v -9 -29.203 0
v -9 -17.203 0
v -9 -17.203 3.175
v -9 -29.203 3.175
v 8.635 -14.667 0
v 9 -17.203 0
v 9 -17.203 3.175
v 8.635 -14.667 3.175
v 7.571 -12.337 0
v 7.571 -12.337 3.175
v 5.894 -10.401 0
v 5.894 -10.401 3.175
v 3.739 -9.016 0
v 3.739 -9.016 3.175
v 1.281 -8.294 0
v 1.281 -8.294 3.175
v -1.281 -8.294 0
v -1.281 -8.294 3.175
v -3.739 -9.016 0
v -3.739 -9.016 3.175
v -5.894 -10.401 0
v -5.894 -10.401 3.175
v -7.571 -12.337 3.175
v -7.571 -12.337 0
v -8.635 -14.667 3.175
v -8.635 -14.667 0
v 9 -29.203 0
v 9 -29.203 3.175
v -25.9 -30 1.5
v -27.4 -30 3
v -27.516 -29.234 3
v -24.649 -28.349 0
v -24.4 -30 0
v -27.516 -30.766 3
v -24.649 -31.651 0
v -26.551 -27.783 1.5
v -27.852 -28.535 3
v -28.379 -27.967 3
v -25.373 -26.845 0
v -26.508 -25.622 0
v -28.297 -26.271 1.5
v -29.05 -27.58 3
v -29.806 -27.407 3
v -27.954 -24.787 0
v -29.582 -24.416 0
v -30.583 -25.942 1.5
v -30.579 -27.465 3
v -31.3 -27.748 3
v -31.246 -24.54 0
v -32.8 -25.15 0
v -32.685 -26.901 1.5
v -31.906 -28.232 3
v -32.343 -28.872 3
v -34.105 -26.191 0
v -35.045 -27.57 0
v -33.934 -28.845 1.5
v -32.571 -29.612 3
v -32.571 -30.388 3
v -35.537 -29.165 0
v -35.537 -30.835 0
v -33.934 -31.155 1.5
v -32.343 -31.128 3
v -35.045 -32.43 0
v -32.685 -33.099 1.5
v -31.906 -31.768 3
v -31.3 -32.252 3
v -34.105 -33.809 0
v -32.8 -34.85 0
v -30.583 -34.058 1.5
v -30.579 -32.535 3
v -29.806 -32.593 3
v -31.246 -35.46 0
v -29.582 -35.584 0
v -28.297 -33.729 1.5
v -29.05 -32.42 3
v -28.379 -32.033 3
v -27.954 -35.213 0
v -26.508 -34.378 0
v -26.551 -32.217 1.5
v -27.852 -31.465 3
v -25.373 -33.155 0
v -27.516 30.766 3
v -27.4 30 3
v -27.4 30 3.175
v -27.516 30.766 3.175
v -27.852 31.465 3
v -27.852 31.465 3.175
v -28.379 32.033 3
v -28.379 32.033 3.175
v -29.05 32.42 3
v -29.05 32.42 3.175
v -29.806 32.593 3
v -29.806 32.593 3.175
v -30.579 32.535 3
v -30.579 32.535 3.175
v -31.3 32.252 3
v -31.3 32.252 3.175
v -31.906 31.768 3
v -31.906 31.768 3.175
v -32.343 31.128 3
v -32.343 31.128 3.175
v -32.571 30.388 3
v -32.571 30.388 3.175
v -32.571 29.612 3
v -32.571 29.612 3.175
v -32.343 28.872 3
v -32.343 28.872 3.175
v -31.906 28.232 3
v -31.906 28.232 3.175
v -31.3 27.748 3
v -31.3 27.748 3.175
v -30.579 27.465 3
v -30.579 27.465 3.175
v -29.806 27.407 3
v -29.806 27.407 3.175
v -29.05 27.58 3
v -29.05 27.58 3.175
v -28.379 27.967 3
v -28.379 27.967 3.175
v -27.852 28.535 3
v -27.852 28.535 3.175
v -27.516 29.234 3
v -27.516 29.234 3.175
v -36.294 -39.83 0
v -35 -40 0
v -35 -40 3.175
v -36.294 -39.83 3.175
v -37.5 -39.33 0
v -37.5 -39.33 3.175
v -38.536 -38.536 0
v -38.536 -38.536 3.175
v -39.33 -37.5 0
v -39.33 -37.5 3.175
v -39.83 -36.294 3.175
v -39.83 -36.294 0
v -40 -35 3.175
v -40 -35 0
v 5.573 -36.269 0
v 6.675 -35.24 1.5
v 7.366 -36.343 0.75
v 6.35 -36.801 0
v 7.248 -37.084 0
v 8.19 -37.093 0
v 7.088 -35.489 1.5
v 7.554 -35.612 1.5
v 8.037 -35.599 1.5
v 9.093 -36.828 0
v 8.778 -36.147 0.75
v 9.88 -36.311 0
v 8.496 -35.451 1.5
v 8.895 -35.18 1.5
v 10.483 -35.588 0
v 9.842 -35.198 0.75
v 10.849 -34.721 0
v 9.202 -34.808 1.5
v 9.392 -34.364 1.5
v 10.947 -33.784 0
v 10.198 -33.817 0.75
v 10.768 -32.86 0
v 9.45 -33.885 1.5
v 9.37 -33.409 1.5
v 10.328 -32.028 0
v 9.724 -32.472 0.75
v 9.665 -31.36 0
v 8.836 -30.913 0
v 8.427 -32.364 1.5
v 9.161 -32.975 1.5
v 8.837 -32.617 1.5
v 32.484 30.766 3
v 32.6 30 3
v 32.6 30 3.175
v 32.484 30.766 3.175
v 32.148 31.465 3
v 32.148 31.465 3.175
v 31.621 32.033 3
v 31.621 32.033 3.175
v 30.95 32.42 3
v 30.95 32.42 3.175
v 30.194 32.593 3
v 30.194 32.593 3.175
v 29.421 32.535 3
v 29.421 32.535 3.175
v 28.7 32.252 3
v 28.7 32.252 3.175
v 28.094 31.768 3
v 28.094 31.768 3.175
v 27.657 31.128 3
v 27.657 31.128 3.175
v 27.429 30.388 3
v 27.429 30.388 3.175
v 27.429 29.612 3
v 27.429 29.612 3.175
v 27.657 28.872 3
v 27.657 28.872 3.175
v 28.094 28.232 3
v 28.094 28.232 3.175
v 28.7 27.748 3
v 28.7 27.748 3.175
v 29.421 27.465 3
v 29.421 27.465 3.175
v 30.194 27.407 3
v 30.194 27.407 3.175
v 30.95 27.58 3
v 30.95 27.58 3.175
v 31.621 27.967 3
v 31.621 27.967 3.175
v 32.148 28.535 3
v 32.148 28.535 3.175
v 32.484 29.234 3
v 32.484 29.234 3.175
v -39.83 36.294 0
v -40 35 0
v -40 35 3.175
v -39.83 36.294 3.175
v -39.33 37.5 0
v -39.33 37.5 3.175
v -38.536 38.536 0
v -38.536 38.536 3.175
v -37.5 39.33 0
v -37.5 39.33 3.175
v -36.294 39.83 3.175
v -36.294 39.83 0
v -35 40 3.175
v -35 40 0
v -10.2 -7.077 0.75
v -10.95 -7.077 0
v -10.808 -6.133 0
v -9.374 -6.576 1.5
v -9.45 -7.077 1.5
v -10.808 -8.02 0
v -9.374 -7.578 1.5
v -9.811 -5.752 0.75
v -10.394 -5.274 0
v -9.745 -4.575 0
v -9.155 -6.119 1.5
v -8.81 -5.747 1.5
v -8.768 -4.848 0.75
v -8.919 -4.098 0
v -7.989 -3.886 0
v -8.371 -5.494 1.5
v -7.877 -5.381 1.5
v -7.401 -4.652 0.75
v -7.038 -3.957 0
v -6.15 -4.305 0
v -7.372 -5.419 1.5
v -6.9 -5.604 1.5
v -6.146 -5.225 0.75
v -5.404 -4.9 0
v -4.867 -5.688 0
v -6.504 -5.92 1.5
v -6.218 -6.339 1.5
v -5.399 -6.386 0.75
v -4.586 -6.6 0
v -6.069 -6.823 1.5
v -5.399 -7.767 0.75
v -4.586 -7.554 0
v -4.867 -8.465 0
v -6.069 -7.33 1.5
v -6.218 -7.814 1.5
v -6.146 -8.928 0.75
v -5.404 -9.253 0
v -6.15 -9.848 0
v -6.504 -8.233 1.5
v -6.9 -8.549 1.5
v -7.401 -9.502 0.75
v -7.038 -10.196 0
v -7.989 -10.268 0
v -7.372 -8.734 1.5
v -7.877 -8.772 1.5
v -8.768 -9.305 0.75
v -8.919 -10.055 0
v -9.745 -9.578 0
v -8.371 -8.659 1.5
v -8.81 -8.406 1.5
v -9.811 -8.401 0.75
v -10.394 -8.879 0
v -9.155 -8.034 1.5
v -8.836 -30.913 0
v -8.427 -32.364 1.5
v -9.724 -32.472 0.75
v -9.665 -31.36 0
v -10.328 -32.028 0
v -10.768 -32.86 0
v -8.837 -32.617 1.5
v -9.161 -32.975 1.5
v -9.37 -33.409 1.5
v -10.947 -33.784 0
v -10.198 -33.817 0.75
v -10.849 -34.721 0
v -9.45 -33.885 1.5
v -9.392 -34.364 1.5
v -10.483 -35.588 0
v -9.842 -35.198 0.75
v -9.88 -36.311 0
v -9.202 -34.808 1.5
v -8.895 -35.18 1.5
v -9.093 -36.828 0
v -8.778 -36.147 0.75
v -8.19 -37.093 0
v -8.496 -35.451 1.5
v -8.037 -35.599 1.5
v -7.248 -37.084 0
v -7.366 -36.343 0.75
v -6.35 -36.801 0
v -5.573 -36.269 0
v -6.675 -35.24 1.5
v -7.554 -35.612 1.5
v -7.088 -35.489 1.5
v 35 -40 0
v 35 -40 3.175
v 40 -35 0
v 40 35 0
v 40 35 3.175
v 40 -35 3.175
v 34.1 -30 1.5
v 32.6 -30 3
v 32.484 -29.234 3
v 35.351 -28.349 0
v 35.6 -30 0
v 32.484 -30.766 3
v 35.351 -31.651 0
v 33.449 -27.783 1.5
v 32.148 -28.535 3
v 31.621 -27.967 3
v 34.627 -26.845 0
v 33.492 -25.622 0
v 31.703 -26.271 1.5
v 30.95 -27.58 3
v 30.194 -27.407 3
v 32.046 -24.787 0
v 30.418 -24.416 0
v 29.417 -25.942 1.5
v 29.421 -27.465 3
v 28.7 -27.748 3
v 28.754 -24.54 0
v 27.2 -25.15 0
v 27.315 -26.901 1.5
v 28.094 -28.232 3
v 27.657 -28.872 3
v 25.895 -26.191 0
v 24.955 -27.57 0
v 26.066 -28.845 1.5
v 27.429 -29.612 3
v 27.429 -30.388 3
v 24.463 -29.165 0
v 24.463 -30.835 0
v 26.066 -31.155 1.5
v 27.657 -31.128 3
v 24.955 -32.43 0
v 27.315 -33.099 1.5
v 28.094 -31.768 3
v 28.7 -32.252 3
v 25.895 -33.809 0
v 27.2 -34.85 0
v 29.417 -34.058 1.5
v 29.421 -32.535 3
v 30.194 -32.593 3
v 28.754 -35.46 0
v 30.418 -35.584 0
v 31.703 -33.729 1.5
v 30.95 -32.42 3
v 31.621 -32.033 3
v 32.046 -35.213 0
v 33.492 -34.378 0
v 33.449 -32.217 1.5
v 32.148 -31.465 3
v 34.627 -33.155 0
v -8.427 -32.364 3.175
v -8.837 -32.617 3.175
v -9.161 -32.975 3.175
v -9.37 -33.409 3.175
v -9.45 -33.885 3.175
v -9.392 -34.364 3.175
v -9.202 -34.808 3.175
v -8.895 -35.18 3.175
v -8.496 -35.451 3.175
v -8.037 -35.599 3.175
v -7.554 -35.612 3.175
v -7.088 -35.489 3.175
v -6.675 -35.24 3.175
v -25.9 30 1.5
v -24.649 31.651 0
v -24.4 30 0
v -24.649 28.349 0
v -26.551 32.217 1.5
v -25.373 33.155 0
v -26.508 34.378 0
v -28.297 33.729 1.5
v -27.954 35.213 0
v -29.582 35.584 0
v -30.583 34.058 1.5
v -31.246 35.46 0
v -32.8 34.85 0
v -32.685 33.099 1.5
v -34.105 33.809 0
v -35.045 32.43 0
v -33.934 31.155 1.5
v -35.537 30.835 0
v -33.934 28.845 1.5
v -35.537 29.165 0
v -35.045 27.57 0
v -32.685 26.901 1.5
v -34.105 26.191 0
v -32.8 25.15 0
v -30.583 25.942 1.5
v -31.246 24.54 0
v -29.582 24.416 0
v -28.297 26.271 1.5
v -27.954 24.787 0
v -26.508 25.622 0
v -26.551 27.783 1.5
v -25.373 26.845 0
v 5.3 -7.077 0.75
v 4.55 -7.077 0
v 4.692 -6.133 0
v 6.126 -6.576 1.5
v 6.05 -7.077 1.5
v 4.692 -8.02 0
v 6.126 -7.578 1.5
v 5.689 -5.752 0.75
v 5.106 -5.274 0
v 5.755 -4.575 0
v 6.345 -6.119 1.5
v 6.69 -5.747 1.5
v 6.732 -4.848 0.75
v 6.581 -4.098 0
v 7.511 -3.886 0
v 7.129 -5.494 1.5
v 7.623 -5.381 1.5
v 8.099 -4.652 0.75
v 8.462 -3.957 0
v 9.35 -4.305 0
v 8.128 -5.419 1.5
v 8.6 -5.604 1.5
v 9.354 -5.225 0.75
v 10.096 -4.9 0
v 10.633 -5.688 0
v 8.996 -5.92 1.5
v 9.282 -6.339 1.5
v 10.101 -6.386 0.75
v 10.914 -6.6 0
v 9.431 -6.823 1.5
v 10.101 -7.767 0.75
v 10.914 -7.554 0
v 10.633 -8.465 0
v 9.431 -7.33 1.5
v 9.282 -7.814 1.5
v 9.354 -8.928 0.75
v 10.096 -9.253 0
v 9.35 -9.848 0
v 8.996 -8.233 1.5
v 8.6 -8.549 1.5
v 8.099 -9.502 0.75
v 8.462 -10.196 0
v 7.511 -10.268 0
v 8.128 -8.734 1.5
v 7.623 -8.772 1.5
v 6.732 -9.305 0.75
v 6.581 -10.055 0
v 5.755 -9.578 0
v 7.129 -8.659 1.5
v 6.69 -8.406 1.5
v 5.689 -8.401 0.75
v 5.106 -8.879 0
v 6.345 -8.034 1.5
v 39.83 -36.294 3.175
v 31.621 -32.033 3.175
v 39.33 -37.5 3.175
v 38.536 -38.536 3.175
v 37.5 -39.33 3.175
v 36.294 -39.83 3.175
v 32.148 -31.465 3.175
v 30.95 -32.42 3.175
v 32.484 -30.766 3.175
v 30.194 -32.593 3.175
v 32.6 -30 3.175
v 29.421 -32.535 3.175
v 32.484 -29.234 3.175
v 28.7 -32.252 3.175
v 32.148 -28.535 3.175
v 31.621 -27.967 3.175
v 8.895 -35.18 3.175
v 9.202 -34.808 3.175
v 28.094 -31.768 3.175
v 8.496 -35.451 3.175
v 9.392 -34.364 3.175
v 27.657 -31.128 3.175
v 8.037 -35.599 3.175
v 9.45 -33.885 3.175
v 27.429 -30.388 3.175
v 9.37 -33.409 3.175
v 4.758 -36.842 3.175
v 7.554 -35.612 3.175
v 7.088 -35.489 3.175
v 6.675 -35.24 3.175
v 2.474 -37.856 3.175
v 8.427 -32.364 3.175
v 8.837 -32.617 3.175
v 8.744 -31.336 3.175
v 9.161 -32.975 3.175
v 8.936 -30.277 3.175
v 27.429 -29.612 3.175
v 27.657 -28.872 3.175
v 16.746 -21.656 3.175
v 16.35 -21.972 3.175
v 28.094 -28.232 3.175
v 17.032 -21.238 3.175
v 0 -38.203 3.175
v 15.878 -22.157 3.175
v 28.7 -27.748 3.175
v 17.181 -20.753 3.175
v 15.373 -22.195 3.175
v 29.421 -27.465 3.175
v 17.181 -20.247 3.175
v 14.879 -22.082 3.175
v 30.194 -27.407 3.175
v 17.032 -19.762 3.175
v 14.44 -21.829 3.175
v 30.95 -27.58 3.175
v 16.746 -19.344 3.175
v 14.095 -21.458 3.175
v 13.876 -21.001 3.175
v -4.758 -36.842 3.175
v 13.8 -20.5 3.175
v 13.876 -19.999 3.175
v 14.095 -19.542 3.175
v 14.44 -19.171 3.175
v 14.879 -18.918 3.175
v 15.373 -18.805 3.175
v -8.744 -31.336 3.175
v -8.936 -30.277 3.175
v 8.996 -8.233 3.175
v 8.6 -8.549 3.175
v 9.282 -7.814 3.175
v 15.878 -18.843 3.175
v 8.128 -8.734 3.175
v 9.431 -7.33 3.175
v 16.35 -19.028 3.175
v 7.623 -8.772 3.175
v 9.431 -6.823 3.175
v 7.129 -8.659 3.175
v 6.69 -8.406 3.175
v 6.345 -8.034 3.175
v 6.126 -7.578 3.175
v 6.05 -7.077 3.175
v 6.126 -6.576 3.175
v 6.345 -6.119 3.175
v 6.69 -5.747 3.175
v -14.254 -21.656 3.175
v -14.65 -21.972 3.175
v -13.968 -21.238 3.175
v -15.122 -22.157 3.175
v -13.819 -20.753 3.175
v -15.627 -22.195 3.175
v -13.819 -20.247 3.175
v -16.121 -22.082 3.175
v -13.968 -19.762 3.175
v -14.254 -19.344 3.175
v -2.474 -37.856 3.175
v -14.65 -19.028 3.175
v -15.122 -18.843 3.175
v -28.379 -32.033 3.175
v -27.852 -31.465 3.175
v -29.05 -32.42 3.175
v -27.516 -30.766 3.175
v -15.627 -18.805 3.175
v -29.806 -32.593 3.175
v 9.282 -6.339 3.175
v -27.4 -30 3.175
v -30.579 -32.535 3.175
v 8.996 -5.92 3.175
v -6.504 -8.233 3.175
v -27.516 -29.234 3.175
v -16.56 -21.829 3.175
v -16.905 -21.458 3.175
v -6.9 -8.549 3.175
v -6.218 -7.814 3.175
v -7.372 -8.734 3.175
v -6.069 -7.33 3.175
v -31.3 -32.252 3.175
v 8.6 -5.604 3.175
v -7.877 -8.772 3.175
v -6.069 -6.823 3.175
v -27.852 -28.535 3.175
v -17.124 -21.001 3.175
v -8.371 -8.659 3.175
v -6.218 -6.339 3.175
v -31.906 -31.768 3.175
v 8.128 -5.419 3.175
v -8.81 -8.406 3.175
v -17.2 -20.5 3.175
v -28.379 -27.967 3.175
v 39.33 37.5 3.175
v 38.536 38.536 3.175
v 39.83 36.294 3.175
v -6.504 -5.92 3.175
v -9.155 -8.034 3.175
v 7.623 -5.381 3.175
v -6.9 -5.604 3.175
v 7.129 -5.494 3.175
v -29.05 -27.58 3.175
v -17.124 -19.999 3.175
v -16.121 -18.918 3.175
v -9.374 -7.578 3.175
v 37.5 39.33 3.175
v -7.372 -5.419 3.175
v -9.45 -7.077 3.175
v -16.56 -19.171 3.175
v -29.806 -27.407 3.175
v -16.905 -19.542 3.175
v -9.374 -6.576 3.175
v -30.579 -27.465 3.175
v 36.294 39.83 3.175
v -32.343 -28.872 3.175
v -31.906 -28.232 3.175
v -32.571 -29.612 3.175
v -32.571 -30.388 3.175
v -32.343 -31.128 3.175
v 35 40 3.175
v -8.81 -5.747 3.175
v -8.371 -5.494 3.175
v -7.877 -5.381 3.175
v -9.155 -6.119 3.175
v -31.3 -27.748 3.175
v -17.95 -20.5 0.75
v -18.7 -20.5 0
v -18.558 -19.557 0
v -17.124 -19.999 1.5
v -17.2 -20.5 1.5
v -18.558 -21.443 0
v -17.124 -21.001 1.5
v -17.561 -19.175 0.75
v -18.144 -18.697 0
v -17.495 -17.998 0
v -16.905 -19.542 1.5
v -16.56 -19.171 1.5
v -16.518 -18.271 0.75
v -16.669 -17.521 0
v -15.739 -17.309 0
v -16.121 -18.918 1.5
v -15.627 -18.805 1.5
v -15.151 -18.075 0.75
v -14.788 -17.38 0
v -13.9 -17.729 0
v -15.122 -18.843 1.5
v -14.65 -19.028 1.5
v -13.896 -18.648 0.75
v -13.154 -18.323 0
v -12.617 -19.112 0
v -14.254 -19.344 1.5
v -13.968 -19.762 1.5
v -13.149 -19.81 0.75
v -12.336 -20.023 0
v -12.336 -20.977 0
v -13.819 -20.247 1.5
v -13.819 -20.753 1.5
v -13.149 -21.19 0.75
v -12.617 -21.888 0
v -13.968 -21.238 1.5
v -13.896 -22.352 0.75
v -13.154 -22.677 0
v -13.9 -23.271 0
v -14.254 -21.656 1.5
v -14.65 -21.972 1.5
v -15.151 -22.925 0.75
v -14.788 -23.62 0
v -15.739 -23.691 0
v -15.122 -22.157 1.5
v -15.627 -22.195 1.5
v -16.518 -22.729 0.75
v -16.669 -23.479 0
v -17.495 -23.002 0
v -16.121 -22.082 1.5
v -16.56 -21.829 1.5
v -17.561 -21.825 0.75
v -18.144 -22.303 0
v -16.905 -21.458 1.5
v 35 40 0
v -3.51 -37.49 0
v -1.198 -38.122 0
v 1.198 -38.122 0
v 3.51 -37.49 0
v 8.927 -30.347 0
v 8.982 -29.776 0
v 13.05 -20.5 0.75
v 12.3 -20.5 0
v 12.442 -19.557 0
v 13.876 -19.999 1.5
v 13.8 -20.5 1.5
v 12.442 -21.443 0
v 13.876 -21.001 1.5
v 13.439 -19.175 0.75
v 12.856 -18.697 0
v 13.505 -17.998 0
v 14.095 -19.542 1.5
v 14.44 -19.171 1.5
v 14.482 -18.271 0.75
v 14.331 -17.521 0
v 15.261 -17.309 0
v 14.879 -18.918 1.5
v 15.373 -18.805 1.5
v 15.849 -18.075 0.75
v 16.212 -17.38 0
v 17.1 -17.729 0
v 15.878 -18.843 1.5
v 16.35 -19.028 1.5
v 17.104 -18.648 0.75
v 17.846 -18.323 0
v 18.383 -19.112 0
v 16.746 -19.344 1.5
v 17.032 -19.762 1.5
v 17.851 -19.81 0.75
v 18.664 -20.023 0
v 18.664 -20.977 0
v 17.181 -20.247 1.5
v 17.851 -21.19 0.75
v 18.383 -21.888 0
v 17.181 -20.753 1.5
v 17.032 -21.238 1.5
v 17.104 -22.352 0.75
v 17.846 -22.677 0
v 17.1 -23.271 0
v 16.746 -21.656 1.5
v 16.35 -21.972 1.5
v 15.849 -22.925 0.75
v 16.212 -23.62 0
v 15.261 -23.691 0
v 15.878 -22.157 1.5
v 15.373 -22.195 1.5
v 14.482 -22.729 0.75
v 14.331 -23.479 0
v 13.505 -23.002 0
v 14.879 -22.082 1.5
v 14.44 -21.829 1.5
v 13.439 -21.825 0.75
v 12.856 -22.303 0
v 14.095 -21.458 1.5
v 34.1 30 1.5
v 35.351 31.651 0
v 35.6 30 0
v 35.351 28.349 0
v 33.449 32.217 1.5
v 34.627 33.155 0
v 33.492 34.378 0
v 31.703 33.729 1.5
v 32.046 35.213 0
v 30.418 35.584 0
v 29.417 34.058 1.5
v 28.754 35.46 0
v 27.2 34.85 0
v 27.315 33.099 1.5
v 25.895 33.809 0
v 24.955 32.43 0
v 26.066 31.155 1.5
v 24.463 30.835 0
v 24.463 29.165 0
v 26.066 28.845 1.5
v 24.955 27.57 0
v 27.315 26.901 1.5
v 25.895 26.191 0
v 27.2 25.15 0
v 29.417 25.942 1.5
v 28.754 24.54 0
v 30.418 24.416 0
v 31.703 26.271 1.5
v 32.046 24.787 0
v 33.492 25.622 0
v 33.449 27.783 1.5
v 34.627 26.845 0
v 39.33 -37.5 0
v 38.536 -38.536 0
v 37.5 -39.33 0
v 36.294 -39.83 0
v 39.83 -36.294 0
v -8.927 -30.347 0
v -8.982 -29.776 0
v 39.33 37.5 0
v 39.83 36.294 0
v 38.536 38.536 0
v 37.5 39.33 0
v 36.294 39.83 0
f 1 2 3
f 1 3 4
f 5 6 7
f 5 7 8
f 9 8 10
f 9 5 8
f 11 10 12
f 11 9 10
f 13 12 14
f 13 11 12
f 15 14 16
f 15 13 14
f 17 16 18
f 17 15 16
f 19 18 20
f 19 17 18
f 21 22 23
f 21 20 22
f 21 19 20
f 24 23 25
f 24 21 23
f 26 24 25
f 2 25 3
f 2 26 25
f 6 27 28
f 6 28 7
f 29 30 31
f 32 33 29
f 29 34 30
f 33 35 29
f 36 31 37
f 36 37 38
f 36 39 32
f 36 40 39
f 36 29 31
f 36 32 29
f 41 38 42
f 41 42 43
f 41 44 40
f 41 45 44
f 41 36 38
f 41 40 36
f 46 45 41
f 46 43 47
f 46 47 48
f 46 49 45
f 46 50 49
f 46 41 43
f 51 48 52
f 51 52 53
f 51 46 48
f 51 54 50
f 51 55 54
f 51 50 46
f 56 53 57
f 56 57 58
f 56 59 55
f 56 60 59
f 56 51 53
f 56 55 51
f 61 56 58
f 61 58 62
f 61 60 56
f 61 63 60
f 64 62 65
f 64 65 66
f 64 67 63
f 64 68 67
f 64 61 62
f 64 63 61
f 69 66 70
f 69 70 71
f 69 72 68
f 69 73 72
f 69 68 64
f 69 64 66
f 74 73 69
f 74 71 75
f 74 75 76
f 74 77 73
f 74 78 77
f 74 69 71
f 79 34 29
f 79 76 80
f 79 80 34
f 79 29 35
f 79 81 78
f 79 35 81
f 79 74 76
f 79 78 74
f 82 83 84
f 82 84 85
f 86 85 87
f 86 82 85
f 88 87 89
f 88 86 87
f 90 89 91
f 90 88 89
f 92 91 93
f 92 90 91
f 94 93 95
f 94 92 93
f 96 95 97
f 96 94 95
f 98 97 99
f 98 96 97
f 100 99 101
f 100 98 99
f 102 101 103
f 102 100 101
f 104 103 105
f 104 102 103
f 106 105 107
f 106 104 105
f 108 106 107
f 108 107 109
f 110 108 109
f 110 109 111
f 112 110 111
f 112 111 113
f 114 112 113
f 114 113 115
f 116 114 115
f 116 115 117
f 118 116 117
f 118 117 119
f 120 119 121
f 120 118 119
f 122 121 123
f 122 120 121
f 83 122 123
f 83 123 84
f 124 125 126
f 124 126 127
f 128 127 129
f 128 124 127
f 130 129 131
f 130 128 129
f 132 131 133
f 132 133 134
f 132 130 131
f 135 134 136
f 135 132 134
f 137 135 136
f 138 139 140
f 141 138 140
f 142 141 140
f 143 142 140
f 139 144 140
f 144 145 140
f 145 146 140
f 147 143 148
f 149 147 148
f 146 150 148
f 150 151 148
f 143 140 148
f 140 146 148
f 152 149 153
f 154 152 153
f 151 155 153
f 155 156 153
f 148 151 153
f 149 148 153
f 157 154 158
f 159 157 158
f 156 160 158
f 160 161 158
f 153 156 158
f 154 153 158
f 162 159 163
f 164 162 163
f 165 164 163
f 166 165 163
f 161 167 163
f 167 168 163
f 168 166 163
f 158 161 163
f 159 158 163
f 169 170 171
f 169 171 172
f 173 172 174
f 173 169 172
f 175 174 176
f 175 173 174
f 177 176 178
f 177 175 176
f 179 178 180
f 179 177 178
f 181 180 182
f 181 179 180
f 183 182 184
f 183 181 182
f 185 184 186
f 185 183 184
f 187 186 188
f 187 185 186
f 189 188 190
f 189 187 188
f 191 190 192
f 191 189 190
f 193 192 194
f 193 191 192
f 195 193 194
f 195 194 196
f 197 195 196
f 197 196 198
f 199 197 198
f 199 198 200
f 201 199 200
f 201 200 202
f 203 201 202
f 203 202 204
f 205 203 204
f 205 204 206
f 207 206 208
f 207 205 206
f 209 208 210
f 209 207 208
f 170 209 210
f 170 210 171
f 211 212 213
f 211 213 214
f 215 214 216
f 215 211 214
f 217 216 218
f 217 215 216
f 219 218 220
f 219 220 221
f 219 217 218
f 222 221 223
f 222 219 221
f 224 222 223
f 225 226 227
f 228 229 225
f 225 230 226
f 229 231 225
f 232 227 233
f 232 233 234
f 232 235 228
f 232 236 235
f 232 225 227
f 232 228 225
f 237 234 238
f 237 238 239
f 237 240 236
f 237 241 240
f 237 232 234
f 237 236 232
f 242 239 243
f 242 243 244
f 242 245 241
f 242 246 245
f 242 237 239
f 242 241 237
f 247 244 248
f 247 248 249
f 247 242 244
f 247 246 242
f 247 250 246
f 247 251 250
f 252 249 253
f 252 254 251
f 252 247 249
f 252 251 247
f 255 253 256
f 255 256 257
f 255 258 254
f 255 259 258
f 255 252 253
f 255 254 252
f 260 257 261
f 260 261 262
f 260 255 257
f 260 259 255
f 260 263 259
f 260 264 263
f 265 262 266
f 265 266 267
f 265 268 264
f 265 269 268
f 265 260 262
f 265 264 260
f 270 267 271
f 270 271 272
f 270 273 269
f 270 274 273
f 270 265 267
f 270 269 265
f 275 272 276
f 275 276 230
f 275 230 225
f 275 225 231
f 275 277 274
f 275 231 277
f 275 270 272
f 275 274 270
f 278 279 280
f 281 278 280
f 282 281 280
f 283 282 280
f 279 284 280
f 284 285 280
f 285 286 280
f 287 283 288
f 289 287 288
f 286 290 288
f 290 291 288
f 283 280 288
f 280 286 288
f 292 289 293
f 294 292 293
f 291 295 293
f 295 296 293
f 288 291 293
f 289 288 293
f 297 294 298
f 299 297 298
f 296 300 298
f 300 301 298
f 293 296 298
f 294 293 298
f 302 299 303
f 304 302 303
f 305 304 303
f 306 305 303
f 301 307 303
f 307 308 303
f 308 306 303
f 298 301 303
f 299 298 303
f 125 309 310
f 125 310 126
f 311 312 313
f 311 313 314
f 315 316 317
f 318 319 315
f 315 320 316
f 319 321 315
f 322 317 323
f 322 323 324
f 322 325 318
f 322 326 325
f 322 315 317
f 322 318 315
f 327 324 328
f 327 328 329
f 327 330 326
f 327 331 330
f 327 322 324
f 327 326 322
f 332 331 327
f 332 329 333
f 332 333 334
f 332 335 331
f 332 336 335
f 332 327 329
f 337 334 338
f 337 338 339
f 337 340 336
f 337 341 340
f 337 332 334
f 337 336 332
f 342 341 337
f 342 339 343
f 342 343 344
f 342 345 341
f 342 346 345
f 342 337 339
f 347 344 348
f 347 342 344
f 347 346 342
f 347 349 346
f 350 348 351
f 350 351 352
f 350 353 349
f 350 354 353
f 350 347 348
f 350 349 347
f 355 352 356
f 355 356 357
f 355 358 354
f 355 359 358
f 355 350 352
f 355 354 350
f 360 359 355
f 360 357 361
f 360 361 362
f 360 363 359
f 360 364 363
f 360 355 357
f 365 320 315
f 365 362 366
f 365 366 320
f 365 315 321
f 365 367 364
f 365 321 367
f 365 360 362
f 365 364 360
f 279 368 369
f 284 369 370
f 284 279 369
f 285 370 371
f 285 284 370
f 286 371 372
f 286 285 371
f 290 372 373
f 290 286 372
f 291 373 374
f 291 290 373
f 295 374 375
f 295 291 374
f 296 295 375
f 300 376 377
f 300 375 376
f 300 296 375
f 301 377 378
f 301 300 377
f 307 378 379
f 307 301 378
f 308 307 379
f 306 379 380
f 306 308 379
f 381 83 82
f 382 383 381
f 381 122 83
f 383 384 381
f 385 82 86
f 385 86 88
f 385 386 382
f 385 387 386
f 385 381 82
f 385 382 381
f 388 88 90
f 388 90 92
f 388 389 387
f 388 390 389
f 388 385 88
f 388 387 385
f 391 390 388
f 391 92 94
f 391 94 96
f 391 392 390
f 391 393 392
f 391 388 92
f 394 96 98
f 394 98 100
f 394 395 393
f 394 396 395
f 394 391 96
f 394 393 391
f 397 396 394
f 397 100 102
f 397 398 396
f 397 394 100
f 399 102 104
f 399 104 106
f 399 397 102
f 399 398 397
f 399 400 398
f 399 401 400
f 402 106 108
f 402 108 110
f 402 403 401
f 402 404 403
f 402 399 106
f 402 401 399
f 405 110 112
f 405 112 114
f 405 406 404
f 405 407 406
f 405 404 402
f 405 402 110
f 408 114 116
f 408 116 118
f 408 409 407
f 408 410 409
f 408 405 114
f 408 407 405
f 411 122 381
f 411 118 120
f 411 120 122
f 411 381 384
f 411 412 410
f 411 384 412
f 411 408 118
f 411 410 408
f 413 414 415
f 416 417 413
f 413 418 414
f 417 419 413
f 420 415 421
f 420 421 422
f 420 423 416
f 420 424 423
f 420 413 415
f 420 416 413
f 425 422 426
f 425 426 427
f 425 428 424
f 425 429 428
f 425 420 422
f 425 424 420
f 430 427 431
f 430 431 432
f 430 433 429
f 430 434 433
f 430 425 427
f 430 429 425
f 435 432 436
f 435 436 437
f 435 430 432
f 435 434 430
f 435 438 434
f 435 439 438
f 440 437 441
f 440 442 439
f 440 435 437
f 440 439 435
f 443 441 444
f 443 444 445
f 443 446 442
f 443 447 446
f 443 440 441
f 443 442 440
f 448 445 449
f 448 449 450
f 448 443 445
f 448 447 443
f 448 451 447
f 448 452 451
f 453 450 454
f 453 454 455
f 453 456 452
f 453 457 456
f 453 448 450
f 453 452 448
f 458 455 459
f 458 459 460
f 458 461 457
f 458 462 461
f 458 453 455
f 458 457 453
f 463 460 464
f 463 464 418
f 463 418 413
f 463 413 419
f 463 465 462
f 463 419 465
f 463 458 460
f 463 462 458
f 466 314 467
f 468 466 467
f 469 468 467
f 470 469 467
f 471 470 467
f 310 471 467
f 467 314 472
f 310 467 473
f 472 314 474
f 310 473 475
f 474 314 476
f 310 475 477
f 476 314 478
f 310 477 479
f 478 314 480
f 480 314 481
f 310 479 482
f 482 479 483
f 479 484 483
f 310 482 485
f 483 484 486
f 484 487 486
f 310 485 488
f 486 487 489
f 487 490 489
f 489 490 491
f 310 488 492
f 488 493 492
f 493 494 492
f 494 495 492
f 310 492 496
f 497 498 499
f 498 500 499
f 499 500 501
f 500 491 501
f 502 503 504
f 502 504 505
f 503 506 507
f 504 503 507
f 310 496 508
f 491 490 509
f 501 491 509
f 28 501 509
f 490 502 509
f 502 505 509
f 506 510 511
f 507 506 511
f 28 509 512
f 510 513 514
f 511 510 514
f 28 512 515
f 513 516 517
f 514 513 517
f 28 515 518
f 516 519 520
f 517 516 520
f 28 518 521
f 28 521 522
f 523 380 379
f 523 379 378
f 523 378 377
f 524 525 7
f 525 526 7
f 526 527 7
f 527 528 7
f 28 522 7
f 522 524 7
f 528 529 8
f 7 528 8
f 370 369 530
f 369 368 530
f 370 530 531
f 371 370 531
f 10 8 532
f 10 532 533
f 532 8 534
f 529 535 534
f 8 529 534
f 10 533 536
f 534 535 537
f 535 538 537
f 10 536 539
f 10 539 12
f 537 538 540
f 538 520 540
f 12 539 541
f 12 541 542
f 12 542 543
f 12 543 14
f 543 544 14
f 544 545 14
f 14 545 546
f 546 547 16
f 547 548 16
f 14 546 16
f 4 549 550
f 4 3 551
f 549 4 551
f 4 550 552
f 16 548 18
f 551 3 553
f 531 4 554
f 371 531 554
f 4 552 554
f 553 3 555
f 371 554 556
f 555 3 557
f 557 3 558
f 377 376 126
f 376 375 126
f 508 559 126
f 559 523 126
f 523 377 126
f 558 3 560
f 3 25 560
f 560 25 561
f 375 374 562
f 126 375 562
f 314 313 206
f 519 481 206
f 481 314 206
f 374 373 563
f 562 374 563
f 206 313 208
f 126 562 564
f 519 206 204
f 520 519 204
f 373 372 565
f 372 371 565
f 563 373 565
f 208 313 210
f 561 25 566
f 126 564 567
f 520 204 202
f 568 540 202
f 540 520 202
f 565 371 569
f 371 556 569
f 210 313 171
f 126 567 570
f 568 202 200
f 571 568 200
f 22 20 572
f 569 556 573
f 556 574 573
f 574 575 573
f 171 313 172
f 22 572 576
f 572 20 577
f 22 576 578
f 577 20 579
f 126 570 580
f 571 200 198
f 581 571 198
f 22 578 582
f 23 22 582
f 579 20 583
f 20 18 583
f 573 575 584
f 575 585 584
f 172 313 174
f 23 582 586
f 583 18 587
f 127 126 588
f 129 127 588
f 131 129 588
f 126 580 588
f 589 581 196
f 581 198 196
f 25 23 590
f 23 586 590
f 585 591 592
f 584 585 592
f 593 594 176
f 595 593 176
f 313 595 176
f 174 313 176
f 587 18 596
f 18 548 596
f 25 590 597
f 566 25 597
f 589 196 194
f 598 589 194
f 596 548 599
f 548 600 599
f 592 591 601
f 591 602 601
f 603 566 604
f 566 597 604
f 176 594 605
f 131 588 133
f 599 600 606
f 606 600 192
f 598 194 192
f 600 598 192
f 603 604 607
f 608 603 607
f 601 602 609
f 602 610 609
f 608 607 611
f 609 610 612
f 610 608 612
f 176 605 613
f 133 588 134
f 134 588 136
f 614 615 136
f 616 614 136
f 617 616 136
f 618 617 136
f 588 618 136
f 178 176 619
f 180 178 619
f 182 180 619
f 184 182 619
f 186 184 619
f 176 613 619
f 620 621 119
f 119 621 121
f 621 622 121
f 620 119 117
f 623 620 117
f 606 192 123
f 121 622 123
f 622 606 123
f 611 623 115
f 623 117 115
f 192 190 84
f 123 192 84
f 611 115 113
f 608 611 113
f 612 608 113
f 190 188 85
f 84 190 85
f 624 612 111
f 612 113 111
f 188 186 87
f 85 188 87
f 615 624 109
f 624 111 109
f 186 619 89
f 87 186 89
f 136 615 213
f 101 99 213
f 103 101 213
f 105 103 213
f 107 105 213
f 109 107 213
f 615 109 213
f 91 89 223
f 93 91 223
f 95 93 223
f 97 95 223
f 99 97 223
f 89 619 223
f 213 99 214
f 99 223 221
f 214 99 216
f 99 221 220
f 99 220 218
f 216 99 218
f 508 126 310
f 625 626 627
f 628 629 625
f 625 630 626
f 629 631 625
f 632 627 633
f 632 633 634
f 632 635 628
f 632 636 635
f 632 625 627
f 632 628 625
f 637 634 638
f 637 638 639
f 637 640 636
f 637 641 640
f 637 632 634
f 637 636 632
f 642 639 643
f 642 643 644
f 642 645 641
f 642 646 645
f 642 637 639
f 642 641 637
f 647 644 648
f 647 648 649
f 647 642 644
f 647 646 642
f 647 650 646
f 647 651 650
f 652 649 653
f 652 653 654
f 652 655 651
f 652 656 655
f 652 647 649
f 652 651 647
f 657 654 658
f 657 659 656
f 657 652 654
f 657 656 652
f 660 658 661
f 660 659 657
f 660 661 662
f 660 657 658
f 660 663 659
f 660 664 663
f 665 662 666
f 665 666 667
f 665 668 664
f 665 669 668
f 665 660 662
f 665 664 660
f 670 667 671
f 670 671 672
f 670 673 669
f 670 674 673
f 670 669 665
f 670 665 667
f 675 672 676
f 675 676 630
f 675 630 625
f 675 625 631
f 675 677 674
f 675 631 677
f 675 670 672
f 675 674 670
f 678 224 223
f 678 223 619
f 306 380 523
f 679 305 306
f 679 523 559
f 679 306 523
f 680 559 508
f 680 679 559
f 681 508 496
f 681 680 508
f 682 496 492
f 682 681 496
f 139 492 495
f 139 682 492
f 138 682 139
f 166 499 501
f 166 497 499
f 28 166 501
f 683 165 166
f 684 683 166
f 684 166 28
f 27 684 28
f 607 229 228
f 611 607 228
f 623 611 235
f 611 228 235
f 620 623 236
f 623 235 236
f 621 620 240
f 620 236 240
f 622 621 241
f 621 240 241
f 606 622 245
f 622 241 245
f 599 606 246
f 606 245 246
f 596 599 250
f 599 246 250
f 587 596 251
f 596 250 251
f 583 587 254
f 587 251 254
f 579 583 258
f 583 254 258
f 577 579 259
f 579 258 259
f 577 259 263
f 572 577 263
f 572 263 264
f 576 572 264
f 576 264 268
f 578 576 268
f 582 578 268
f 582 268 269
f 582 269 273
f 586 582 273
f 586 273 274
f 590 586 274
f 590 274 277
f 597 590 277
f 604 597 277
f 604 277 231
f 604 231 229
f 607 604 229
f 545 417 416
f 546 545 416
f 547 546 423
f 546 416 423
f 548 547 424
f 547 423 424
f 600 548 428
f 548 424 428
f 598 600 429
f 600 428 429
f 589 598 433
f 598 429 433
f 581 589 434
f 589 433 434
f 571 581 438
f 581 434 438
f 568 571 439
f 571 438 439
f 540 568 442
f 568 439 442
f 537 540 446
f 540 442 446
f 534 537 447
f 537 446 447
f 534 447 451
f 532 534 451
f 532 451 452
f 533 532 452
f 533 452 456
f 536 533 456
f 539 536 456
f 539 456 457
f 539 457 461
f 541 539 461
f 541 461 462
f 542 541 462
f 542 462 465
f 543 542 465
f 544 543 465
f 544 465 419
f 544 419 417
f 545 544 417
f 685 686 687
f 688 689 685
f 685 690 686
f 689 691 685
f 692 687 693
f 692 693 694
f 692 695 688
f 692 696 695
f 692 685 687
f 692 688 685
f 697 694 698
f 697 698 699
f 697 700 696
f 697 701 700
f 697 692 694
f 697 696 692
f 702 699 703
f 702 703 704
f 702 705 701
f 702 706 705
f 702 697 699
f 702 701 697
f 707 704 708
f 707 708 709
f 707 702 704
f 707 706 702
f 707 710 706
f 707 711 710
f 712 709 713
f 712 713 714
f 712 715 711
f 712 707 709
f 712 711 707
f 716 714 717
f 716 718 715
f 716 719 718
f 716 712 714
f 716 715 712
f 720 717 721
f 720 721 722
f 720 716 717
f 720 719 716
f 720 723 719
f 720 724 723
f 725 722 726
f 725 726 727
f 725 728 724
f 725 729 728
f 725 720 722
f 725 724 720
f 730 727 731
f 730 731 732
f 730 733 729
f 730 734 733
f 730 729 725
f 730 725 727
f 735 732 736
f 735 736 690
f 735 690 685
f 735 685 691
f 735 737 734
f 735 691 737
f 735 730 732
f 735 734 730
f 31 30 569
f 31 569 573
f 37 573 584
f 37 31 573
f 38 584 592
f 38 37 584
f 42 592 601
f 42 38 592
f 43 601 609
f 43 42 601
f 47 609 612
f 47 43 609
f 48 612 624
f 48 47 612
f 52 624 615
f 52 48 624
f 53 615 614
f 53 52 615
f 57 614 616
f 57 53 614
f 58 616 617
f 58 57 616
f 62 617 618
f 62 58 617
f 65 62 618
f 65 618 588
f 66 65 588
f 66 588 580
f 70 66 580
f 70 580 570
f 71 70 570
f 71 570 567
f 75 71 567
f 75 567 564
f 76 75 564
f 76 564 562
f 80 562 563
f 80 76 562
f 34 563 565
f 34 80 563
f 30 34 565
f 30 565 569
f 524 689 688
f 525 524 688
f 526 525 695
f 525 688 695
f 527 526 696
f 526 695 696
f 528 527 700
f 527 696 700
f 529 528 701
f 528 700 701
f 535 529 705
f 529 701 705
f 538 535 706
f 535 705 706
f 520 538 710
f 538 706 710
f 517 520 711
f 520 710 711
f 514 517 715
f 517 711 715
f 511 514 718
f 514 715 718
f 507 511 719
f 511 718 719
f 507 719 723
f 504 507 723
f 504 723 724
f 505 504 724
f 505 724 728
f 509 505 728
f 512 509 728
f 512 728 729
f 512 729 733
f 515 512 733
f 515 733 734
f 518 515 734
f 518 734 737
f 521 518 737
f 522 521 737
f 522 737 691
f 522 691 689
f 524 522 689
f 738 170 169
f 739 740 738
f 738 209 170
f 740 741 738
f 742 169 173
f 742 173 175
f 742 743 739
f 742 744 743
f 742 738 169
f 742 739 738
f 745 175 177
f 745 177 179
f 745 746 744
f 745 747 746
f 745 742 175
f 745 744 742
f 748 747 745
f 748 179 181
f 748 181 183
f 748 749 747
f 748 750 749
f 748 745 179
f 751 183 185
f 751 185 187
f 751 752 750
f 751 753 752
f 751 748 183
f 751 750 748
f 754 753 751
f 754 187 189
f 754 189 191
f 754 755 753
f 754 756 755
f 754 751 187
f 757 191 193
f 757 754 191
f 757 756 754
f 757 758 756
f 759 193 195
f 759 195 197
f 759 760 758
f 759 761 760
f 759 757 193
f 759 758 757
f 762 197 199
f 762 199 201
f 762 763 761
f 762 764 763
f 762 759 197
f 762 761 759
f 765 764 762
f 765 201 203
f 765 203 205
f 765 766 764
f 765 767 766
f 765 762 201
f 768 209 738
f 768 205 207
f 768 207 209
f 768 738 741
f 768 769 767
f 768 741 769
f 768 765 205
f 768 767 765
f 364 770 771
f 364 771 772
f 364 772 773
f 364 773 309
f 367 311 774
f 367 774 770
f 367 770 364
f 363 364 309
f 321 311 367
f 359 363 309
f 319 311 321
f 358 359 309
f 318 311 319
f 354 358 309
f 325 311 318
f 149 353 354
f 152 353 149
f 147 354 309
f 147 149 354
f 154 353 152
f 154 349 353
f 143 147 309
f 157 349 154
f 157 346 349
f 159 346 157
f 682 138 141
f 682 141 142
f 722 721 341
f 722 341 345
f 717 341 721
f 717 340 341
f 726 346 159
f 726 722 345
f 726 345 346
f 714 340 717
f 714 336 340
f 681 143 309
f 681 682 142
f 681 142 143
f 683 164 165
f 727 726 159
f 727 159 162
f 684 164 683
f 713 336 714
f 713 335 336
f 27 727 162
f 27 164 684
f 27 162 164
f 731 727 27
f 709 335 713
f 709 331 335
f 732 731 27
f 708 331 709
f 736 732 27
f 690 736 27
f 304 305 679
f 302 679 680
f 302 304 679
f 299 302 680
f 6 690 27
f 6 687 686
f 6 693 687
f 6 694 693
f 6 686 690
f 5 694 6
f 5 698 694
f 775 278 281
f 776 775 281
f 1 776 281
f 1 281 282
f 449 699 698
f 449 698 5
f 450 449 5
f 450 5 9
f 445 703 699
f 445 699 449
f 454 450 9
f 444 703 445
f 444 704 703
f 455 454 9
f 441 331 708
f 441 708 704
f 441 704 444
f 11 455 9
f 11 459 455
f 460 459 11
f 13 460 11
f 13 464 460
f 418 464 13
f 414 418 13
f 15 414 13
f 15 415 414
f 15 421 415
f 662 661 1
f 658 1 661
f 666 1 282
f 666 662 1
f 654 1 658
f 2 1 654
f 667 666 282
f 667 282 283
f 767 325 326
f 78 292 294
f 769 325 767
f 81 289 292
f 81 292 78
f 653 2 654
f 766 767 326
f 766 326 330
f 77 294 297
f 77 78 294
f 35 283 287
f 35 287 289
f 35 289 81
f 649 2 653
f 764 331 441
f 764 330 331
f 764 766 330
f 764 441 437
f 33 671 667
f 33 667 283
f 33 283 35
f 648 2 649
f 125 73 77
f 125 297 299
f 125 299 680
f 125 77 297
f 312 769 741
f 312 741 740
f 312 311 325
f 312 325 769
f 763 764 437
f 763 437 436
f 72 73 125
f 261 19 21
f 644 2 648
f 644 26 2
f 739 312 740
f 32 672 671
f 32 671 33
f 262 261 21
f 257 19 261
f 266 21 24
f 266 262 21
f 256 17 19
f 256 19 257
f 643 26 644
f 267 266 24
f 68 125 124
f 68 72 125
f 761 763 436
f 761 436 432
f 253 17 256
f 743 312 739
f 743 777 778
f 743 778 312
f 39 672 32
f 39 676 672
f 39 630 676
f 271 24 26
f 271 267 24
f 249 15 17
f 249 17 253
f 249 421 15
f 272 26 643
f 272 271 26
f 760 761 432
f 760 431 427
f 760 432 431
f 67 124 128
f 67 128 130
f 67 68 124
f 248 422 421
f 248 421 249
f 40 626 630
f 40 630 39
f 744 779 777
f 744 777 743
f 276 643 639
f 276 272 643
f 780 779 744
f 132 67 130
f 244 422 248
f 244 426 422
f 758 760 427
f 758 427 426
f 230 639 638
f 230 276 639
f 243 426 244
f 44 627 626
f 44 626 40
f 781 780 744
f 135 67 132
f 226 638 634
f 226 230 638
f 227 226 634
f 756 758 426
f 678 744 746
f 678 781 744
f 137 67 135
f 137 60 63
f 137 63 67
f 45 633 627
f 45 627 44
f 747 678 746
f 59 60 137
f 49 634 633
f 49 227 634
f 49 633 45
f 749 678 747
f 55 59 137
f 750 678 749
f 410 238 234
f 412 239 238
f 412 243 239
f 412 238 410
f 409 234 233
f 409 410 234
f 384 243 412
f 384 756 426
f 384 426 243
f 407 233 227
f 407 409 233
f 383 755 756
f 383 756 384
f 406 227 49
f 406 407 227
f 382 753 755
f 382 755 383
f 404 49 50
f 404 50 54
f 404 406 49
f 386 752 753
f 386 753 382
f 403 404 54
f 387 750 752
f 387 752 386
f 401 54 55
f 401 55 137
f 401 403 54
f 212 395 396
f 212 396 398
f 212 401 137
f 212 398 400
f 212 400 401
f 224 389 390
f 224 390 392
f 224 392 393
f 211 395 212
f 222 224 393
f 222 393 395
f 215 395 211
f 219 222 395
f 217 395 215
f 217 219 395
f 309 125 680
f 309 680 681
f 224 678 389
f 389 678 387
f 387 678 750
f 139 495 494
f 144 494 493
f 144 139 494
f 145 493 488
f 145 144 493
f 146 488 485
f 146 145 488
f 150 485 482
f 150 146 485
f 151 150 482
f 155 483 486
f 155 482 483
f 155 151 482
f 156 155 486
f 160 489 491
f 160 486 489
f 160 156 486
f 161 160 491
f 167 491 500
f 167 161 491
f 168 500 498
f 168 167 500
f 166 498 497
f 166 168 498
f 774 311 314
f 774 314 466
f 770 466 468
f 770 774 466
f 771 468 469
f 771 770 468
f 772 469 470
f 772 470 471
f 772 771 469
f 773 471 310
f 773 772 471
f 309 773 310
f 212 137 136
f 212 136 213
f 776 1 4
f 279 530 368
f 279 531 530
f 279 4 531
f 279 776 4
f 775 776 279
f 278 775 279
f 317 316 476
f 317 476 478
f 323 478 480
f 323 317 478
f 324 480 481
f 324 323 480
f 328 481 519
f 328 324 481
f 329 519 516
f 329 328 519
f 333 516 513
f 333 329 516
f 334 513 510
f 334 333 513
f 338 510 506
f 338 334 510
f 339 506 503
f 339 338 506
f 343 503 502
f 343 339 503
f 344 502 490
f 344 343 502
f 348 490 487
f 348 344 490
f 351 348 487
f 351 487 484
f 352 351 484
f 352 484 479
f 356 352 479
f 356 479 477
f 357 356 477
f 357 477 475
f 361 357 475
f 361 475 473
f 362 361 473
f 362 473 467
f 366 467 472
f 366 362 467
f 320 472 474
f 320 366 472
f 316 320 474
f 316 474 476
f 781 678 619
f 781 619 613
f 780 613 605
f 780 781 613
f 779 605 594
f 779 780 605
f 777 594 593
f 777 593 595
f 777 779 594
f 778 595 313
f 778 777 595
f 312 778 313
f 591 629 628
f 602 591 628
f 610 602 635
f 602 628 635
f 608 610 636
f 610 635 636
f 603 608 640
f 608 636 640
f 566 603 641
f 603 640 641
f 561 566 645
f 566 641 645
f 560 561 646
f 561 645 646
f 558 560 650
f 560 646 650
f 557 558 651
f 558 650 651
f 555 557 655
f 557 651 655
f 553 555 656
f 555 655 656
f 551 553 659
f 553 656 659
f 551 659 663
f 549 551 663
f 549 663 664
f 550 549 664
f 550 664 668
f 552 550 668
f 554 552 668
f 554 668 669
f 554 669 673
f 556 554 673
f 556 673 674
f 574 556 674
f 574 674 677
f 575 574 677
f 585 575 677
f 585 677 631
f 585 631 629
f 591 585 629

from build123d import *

# Parameters (mm, degrees)
SKETCH1_R           = 2.6
BOSS_EXTRUDE1_DEPTH = 3.175
CHAMFER1_SIZE       = 3
SKETCH4_R           = 1.7
CUT_EXTRUDE2_DEPTH  = 4.175
CHAMFER2_SIZE       = 1.5


with BuildPart() as part:
    # Sketch1 → Boss-Extrude1 (new body)
    with BuildSketch(Plane.XY):
        with BuildLine():
            Line((35, -40), (-35, -40))
            ThreePointArc((-35, -40), (-38.535533906, -38.535533906), (-40, -35))
            Line((-40, -35), (-40, 35))
            ThreePointArc((-40, 35), (-38.535533906, 38.535533906), (-35, 40))
            Line((-35, 40), (35, 40))
            ThreePointArc((35, 40), (38.535533906, 38.535533906), (40, 35))
            Line((40, 35), (40, -35))
            ThreePointArc((40, -35), (38.535533906, -38.535533906), (35, -40))
        make_face()
        with Locations((-30, 30)):
            Circle(SKETCH1_R, mode=Mode.SUBTRACT)
        with Locations((30, 30)):
            Circle(SKETCH1_R, mode=Mode.SUBTRACT)
        with Locations((30, -30)):
            Circle(SKETCH1_R, mode=Mode.SUBTRACT)
        with Locations((-30, -30)):
            Circle(SKETCH1_R, mode=Mode.SUBTRACT)
    extrude(amount=BOSS_EXTRUDE1_DEPTH)

    # Chamfer1
    chamfer1_edges = [part.edges().sort_by_distance(p)[0] for p in [
        (-32.6, 30, 0),
        (27.4, 30, 0),
        (27.4, -30, 0),
        (-32.6, -30, 0),
    ]]
    chamfer(chamfer1_edges, length=CHAMFER1_SIZE)

    # Sketch4 → Cut-Extrude2 (cut, through all)
    with BuildSketch(Plane(origin=(0, 0, 0), x_dir=(-1, 0, 0), z_dir=(0, 0, -1))):
        with Locations((-15.5, -20.5)):
            Circle(SKETCH4_R)
        with Locations((-7.75, -7.076606241)):
            Circle(SKETCH4_R)
        with Locations((7.75, -7.076606241)):
            Circle(SKETCH4_R)
        with Locations((15.5, -20.5)):
            Circle(SKETCH4_R)
        with BuildLine():
            Line((9, -17.202559976), (9, -29.202559976))
            ThreePointArc((9, -29.202559976), (8.855473359, -30.808981962), (8.426535201, -32.363810442))
            ThreePointArc((8.426535201, -32.363810442), (9.201851044, -34.807774076), (6.674545917, -35.23997969))
            ThreePointArc((6.674545917, -35.23997969), (0, -38.202559976), (-6.674545917, -35.23997969))
            ThreePointArc((-6.674545917, -35.23997969), (-9.201851044, -34.807774076), (-8.426535201, -32.363810442))
            ThreePointArc((-8.426535201, -32.363810442), (-8.855473359, -30.808981962), (-9, -29.202559976))
            Line((-9, -29.202559976), (-9, -17.202559976))
            ThreePointArc((-9, -17.202559976), (0, -8.202559976), (9, -17.202559976))
        make_face()
    extrude(amount=-CUT_EXTRUDE2_DEPTH, mode=Mode.SUBTRACT)

    # Chamfer2
    chamfer2_edges = [part.edges().sort_by_distance(p)[0] for p in [
        (17.2, -20.5, 0),
        (9.45, -7.076606241, 0),
        (-13.8, -20.5, 0),
        (9.201851044, -34.807774076, 0),
        (-9.201851044, -34.807774076, 0),
        (-6.05, -7.076606241, 0),
    ]]
    chamfer(chamfer2_edges, length=CHAMFER2_SIZE)


solid = part.part
